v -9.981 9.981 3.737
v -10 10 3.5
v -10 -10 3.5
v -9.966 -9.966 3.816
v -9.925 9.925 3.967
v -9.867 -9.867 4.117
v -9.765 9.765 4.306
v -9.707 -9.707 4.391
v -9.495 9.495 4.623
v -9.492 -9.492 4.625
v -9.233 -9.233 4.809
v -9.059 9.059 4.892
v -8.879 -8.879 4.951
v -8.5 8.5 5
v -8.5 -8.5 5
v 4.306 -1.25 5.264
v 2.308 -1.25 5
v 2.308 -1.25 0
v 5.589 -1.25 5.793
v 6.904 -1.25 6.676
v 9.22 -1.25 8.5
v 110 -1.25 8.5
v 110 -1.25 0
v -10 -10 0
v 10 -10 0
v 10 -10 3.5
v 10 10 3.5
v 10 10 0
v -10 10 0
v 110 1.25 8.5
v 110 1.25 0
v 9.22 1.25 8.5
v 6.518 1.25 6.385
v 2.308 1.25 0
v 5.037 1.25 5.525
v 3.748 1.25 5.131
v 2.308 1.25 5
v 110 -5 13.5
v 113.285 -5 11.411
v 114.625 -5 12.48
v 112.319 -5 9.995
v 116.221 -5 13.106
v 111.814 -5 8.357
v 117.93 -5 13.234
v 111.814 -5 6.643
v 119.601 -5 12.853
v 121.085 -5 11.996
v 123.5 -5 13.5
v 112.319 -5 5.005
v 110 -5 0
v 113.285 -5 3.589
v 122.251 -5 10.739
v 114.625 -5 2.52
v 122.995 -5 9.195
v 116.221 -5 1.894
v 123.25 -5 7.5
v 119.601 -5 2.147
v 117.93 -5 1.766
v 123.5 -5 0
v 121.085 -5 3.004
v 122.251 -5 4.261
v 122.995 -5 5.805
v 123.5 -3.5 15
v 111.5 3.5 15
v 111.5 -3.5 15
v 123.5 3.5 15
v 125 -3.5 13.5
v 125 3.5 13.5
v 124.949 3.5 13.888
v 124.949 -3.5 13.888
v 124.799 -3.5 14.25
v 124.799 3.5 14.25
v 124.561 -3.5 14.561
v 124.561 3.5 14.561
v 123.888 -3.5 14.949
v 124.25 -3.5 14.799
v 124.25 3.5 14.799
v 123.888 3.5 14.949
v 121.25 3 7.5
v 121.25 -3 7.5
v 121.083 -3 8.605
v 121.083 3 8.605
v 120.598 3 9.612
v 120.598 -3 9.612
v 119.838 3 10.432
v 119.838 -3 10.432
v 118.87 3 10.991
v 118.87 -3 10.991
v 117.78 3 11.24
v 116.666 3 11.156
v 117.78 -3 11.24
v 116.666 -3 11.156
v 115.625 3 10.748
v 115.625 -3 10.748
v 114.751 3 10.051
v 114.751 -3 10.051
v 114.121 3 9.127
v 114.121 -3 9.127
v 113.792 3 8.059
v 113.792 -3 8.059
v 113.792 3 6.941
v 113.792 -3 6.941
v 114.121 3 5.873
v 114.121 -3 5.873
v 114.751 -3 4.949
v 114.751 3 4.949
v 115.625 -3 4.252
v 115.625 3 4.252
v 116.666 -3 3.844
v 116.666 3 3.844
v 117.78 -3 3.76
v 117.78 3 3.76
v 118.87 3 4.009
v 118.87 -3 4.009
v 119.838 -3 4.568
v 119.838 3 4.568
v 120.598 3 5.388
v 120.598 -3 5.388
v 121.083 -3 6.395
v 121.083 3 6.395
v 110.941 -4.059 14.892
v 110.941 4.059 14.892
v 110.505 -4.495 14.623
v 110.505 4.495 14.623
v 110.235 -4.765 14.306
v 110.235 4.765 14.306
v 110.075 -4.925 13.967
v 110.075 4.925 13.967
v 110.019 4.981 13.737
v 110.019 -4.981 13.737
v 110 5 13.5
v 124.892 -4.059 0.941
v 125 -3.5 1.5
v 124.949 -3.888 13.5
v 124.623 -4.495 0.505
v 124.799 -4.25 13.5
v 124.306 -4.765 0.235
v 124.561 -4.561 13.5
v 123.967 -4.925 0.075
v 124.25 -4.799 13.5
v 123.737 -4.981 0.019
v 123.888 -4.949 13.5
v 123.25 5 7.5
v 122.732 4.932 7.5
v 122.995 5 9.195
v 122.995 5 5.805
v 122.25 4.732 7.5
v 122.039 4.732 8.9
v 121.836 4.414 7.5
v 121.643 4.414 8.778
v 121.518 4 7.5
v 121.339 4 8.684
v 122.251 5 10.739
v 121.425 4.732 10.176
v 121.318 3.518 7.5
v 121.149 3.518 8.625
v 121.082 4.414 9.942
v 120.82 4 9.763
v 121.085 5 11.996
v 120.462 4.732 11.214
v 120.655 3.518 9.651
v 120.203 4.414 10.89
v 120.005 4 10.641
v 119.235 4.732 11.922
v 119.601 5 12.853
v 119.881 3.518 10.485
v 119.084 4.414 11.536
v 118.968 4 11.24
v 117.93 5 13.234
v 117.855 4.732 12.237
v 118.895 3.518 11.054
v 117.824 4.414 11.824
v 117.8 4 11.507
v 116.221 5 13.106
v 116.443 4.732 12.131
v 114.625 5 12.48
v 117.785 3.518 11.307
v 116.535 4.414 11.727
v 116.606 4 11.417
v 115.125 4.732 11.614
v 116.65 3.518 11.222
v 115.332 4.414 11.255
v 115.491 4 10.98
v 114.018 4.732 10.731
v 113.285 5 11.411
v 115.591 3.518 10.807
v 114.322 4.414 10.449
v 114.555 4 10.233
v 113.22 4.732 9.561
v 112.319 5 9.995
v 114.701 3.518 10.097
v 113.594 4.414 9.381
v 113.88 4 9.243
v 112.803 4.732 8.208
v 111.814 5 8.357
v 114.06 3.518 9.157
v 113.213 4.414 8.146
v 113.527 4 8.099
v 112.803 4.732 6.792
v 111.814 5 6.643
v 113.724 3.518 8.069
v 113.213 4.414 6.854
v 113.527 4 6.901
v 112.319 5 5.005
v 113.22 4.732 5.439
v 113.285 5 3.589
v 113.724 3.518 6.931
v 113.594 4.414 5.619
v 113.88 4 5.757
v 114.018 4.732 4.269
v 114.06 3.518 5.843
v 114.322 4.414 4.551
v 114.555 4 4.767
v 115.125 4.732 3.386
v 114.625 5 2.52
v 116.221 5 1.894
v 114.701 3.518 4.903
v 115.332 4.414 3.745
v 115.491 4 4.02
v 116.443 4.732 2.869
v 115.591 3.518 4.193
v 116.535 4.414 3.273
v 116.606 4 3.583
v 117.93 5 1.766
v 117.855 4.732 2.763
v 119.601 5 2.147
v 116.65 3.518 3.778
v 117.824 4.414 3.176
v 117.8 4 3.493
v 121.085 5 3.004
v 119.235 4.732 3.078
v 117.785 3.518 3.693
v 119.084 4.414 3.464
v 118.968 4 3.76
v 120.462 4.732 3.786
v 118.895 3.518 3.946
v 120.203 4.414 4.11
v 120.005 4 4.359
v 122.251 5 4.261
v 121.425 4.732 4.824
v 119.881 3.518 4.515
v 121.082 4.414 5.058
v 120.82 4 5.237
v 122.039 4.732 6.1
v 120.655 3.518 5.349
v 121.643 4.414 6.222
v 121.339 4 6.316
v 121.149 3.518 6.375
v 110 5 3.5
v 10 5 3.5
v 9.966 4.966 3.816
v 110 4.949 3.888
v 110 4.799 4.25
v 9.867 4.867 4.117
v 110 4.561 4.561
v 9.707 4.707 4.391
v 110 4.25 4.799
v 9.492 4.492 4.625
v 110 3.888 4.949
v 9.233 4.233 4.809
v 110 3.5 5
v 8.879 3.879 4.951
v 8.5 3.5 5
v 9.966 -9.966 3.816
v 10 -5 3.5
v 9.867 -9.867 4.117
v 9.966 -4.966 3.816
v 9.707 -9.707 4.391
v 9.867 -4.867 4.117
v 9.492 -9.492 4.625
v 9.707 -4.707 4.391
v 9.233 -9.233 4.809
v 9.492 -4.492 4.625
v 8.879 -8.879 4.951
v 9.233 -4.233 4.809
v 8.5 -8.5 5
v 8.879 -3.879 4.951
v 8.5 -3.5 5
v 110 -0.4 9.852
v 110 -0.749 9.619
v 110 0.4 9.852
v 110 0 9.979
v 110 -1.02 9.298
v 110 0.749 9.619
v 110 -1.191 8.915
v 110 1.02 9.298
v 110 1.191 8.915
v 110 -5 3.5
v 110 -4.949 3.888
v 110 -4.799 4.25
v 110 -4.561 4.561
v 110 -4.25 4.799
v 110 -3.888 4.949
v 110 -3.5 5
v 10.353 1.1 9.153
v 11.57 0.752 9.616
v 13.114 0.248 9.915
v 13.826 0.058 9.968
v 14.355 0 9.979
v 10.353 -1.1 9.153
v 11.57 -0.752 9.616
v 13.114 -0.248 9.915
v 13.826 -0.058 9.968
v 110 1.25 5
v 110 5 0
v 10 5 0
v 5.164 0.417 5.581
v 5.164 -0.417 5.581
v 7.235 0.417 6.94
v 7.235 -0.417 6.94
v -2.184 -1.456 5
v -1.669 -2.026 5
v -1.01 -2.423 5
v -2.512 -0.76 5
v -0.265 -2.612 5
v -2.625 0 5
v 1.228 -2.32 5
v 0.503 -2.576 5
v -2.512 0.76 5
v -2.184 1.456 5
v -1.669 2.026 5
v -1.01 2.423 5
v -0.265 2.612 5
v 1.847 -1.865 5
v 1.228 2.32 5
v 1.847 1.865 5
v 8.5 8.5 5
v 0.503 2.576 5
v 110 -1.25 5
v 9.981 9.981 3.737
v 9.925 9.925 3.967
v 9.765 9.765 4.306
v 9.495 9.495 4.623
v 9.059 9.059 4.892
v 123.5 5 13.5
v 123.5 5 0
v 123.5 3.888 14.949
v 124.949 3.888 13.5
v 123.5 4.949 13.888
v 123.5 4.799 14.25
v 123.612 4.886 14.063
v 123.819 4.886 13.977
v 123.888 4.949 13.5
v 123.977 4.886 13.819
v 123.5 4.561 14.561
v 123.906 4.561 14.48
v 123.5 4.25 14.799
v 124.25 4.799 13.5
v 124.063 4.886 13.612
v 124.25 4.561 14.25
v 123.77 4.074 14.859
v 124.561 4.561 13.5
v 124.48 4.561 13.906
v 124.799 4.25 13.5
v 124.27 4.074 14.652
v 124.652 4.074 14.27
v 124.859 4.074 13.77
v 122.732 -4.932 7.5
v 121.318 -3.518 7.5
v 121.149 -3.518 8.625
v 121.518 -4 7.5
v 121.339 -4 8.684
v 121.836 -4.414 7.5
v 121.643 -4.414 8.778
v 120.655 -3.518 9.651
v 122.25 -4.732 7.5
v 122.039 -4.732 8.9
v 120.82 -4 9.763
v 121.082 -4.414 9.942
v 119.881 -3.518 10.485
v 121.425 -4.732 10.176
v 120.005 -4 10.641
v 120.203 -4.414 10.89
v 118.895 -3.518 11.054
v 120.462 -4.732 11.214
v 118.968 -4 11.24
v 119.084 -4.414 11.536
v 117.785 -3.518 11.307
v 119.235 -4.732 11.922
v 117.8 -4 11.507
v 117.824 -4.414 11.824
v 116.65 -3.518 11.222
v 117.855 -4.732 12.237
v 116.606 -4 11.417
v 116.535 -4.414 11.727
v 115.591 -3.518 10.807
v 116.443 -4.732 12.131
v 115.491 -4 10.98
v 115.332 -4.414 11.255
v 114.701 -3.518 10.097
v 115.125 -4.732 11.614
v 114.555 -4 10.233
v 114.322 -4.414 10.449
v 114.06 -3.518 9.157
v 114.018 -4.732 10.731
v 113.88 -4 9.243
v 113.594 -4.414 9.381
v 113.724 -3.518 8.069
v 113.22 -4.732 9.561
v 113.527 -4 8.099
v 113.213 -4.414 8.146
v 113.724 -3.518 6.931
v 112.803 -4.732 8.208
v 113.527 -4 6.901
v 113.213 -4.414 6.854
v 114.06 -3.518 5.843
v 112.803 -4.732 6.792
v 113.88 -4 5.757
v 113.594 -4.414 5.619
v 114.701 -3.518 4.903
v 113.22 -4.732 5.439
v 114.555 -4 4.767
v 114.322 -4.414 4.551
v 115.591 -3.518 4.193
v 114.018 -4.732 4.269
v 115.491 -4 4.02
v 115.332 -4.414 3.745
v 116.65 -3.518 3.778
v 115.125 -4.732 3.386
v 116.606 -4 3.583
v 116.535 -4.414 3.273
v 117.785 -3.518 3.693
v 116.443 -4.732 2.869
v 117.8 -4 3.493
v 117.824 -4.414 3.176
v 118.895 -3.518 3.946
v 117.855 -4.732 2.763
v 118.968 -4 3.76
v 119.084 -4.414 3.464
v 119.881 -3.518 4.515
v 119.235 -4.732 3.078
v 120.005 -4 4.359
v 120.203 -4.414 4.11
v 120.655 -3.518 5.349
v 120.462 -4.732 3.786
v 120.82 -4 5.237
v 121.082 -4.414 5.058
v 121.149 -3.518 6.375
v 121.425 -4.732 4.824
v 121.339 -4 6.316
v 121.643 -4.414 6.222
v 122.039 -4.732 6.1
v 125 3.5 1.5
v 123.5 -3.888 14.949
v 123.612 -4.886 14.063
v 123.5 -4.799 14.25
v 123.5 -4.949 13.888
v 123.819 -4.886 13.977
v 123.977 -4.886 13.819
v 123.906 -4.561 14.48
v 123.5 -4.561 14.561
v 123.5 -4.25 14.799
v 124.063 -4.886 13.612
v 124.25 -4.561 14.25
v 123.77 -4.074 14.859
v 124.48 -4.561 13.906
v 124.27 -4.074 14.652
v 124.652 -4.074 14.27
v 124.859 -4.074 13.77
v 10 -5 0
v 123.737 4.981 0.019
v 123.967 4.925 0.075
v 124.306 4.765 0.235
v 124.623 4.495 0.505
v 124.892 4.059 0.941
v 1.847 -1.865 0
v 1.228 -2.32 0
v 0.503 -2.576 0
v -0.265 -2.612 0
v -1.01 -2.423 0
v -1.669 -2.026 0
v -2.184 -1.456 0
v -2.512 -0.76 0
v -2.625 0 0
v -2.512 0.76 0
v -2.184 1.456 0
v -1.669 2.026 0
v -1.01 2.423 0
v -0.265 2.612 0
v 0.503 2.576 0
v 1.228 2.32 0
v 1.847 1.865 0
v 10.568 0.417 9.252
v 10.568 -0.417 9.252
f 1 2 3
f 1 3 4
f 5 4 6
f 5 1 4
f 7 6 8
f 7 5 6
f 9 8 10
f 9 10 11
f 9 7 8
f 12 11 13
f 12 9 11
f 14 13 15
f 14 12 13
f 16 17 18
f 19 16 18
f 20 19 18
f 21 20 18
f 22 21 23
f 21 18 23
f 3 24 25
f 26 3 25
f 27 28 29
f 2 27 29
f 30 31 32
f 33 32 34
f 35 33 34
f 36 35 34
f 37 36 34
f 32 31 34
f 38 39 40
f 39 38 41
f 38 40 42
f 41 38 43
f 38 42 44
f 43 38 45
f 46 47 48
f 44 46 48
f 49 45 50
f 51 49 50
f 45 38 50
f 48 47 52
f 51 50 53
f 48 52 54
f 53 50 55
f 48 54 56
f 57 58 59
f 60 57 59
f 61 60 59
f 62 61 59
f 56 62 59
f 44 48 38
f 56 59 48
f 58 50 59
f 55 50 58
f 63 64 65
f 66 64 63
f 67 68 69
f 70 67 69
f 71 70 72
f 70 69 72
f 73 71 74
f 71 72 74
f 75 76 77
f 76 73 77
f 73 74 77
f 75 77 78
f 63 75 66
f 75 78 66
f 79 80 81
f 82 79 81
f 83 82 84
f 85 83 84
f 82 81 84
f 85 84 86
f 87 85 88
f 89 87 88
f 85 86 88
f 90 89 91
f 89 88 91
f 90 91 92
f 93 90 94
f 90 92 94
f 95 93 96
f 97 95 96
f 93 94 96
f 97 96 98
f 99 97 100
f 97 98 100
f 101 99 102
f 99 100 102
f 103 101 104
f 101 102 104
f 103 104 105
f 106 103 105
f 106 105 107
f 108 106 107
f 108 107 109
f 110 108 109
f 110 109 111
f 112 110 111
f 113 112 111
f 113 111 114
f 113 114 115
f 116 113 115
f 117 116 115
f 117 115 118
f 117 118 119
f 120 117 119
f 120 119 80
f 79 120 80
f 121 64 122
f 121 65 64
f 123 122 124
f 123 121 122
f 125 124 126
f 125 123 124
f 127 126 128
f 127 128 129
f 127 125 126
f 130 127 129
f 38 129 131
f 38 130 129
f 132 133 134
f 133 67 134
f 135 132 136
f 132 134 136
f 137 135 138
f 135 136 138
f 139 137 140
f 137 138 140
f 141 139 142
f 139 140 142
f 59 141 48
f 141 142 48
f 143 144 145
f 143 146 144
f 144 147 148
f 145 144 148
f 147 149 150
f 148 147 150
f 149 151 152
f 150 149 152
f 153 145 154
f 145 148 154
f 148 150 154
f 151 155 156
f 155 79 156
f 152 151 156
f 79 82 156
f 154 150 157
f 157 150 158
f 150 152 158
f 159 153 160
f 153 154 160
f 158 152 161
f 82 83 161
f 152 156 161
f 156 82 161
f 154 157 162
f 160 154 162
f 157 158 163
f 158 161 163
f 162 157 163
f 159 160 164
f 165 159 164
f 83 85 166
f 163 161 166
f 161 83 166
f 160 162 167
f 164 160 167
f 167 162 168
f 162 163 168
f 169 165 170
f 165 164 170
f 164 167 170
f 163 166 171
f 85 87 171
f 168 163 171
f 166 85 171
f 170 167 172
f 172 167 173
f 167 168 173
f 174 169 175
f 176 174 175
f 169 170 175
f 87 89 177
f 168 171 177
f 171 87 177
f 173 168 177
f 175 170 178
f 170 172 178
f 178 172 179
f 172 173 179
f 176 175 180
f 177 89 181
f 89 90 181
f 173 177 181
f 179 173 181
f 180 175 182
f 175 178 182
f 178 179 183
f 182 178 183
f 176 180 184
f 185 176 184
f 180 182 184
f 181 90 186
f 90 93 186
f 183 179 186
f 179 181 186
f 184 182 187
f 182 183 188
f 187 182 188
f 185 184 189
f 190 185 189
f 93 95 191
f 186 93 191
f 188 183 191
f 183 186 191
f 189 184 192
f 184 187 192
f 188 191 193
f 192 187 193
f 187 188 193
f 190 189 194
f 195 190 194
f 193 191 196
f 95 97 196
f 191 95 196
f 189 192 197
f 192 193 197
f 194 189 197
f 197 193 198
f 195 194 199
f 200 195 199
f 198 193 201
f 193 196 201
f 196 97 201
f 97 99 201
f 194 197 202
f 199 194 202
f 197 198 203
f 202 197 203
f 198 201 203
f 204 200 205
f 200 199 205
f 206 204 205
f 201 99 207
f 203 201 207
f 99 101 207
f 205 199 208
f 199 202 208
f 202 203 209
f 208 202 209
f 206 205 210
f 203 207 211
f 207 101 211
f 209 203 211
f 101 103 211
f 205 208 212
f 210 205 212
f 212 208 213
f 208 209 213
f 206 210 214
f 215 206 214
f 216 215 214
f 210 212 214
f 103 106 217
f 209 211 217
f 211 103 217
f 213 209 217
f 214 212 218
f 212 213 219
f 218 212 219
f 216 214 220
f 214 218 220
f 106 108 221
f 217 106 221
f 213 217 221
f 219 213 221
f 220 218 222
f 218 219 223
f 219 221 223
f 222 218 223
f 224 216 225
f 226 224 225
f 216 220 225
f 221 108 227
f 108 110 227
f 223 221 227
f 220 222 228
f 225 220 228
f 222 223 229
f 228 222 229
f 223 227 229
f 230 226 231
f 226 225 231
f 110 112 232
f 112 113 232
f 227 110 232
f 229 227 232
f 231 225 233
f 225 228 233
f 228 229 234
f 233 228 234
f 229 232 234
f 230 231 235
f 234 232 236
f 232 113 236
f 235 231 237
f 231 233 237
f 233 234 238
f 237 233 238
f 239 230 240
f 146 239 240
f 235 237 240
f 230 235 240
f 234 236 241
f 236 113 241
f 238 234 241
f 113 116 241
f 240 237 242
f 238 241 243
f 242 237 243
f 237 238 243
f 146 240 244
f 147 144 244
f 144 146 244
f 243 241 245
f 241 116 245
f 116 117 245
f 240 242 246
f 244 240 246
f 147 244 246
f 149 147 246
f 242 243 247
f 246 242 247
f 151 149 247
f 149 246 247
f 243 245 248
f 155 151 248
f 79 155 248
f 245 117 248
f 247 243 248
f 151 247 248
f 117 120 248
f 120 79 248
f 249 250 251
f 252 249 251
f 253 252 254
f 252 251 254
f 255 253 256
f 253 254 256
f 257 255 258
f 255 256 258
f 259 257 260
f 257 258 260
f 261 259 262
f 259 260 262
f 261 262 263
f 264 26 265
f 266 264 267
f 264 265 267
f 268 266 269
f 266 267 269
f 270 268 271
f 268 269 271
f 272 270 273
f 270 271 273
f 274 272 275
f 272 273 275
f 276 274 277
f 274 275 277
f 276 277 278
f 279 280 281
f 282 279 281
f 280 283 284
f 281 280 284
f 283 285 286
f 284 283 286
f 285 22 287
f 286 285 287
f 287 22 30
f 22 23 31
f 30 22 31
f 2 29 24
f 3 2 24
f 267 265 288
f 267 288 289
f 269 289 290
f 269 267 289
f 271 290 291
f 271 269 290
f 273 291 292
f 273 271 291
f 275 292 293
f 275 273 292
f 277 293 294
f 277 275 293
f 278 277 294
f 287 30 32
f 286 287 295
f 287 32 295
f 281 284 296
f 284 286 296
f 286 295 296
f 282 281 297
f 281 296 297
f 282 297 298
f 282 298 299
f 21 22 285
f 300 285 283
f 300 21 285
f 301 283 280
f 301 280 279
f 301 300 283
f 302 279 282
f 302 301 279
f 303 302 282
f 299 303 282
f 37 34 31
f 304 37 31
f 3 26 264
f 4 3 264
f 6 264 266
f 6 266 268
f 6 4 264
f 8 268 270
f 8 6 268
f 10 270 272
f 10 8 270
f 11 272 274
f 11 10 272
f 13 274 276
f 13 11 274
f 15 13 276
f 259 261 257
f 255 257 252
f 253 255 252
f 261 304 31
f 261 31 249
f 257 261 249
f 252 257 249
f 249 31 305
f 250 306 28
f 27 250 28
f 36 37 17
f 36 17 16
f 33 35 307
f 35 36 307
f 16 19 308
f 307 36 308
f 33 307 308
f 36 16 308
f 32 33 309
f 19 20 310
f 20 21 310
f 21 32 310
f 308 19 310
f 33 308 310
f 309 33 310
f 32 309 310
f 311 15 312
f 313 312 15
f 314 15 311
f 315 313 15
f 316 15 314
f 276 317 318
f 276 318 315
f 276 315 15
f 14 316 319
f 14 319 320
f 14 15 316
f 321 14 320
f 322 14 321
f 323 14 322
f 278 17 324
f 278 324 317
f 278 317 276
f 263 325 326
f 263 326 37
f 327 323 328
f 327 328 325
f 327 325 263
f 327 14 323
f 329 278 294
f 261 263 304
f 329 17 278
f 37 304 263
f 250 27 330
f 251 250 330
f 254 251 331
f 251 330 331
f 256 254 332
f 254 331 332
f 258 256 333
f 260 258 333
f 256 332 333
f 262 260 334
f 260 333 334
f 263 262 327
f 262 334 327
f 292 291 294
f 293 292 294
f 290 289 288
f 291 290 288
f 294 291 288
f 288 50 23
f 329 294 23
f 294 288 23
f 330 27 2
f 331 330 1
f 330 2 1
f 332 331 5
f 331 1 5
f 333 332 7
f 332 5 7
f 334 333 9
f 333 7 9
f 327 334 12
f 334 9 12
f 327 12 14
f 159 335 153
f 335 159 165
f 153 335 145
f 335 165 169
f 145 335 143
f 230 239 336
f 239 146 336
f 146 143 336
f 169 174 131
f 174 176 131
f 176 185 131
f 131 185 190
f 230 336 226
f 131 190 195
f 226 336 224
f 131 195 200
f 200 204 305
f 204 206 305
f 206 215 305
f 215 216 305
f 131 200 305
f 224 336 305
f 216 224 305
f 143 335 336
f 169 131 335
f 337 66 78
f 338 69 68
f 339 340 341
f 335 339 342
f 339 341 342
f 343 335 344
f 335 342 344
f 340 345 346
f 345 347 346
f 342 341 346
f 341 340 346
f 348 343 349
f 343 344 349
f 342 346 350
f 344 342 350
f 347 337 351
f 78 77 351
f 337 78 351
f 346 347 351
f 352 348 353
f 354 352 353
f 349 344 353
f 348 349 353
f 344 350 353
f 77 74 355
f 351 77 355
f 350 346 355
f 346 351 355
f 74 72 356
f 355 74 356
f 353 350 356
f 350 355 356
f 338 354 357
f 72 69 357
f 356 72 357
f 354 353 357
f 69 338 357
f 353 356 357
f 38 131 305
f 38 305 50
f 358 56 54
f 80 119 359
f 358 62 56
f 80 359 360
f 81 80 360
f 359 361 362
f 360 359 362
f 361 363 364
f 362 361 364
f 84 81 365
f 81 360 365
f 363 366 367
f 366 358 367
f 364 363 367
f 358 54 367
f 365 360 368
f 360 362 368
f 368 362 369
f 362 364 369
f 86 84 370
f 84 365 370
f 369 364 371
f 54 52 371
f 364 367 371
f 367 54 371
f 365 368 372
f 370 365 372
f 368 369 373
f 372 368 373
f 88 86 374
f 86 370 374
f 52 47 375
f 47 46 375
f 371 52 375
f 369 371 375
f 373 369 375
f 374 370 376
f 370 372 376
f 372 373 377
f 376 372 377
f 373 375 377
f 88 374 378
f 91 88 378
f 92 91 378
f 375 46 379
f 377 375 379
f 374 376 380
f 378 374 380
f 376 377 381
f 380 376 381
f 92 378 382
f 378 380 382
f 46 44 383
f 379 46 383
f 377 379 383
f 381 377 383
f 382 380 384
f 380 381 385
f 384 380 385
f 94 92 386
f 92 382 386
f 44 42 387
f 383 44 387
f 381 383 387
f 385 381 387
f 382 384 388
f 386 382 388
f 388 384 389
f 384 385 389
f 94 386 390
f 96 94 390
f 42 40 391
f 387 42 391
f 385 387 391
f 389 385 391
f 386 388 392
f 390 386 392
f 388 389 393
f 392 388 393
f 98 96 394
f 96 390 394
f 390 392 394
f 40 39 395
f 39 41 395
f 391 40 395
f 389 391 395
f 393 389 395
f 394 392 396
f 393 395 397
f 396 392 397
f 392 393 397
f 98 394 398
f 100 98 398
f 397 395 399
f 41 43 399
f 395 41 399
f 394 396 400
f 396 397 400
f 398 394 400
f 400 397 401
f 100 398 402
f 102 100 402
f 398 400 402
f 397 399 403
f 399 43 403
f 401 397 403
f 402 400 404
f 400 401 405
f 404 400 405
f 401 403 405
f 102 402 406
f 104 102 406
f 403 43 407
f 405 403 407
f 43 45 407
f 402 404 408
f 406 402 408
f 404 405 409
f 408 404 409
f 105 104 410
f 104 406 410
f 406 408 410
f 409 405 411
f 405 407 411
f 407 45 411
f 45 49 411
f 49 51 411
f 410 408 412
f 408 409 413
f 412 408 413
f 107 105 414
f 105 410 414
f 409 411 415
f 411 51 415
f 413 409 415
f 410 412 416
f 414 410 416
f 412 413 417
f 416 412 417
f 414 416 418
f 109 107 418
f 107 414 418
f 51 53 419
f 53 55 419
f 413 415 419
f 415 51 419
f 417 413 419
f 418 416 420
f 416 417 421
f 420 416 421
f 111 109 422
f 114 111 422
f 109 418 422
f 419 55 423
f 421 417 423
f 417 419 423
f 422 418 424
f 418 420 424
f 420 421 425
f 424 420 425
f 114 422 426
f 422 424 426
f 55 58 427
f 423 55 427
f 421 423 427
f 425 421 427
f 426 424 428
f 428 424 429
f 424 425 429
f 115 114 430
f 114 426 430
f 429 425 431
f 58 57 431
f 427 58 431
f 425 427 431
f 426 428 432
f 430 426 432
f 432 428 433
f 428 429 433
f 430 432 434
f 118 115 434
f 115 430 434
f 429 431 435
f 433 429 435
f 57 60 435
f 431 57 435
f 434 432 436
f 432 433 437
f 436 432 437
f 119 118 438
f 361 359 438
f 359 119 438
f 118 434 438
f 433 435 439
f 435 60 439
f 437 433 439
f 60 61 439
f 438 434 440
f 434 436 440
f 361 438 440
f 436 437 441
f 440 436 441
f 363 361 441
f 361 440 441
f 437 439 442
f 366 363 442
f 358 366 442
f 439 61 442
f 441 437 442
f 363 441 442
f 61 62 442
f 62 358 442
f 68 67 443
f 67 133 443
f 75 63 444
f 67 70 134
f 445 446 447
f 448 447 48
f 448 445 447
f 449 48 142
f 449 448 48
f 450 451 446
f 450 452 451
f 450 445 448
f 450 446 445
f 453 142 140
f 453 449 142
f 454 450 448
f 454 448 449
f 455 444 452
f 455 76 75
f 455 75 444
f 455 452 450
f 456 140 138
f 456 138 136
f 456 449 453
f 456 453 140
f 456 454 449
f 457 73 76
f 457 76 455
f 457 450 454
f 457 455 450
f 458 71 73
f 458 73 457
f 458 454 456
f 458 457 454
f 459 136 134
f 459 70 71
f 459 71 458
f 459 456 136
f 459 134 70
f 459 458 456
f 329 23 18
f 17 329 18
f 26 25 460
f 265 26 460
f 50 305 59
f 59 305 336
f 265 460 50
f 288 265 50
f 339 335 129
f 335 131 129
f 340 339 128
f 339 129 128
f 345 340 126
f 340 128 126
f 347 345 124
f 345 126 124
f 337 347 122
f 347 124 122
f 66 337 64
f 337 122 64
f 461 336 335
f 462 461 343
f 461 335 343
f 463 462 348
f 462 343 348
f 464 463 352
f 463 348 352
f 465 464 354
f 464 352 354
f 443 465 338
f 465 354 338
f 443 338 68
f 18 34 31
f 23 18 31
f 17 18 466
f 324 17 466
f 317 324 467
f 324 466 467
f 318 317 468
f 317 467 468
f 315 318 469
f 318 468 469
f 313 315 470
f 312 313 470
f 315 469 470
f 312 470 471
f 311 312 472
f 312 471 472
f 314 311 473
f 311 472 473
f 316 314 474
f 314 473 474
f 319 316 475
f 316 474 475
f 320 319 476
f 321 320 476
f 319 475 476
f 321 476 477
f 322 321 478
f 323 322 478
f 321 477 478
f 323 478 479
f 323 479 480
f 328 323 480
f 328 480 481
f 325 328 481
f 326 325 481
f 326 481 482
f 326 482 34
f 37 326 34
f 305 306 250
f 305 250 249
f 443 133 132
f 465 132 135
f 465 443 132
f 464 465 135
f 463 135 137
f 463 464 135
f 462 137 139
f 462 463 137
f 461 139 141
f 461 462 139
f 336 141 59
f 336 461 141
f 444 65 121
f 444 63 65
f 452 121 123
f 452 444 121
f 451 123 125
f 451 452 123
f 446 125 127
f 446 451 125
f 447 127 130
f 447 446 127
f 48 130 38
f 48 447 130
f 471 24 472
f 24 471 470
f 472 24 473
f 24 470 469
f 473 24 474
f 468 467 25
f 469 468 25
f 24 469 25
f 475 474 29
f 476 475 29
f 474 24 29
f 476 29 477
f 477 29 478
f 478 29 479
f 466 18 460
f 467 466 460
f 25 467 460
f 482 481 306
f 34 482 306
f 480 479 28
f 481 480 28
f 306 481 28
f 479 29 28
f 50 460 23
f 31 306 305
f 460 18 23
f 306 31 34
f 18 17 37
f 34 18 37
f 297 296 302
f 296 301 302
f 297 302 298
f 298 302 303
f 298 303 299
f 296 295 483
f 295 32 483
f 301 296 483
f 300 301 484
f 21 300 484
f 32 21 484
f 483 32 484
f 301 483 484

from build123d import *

# Parameters (mm, degrees)
F0_W          = 100
F0_H          = 3.75
F1_DEPTH      = 5
F0_H_2        = 2.5
F2_DEPTH      = 10
F3_DEPTH      = 15
F4_R          = 3.75
F5_DEPTH      = 30.025
F6_R          = 1.5
F7_T1_DEPTH   = 103.75
F7_T3_DEPTH   = 27.5
F7_T5_DEPTH   = 8.75
F7_T7_DEPTH   = 8.75
F7_T9_DEPTH   = 27.5
F7_T15_DEPTH  = 12.5
F7_T19_DEPTH  = 107.5
F7_T26_DEPTH  = 107.5
F7_T30_DEPTH  = 12.5
F7_2_T1_DEPTH = 117.5
F9_DEPTH      = 25
F9_FACE_W     = 2.3082731641
F9_FACE_H     = 2.5
F10_DEPTH     = 25
F11_R         = 2


# Not quite as in the source:
# - a fillet or chamfer that OpenCascade refuses, or shapes differently, is made with other operations: its cross-section is extruded or revolved along the edge and cut away or added
# - a feature names something its author has since deleted; it is built from what else it names


with BuildPart() as f1:
    # F0 (on Top) → F1 (new body)
    with BuildSketch(Plane.XY):
        with BuildLine():
            Line((10, 10), (-10, 10))
            Line((-10, 10), (-10, -10))
            Line((-10, -10), (10, -10))
            Line((10, -10), (10, -5))
            Line((10, -5), (10, -1.25))
            Line((10, -1.25), (2.3082731641, -1.25))
            ThreePointArc((2.3082731641, -1.25), (-2.625, 0), (2.3082731641, 1.25))
            Line((2.3082731641, 1.25), (10, 1.25))
            Line((10, 1.25), (10, 5))
            Line((10, 5), (10, 10))
        make_face()
        with Locations((60, 3.125)):
            Rectangle(F0_W, F0_H)
        with Locations((60, -3.125)):
            Rectangle(F0_W, F0_H)
    extrude(amount=F1_DEPTH)

    # F7: fillet of radius 1.5 on 7 edges, made by hand

    # F7_s2 → F7_t1 (cut)
    with BuildSketch(Plane.YZ.offset(10)):
        with BuildLine():
            ThreePointArc((-5, 3.5), (-4.5606601718, 4.5606601718), (-3.5, 5))
            Line((-3.5, 5), (-5, 5))
            Line((-5, 5), (-5, 3.5))
        make_face()
        with BuildLine():
            ThreePointArc((5, 3.5), (4.5606601718, 4.5606601718), (3.5, 5))
            Line((3.5, 5), (5, 5))
            Line((5, 5), (5, 3.5))
        make_face()
    extrude(amount=F7_T1_DEPTH, mode=Mode.SUBTRACT)

    # F7_s4 → F7_t3 (cut)
    with BuildSketch(Plane.YZ.offset(-13.75)):
        with BuildLine():
            ThreePointArc((10, 3.5), (9.5606601718, 4.5606601718), (8.5, 5))
            Line((8.5, 5), (10, 5))
            Line((10, 5), (10, 3.5))
        make_face()
        with BuildLine():
            ThreePointArc((-10, 3.5), (-9.5606601718, 4.5606601718), (-8.5, 5))
            Line((-8.5, 5), (-10, 5))
            Line((-10, 5), (-10, 3.5))
        make_face()
    extrude(amount=F7_T3_DEPTH, mode=Mode.SUBTRACT)

    # F7_s6 → F7_t5 (cut)
    with BuildSketch(Plane.XZ.offset(-13.75)):
        with BuildLine():
            ThreePointArc((10, 3.5), (9.5606601718, 4.5606601718), (8.5, 5))
            Line((8.5, 5), (10, 5))
            Line((10, 5), (10, 3.5))
        make_face()
    extrude(amount=F7_T5_DEPTH, mode=Mode.SUBTRACT)

    # F7_s8 → F7_t7 (cut)
    with BuildSketch(Plane.XZ.offset(5)):
        with BuildLine():
            ThreePointArc((10, 3.5), (9.5606601718, 4.5606601718), (8.5, 5))
            Line((8.5, 5), (10, 5))
            Line((10, 5), (10, 3.5))
        make_face()
    extrude(amount=F7_T7_DEPTH, mode=Mode.SUBTRACT)

    # F7_s10 → F7_t9 (cut)
    with BuildSketch(Plane.XZ.offset(-13.75)):
        with BuildLine():
            ThreePointArc((-10, 3.5), (-9.5606601718, 4.5606601718), (-8.5, 5))
            Line((-8.5, 5), (-10, 5))
            Line((-10, 5), (-10, 3.5))
        make_face()
    extrude(amount=F7_T9_DEPTH, mode=Mode.SUBTRACT)


with BuildPart() as f2:
    # F0 (on Top) → F2 (new body)
    with BuildSketch(Plane.XY):
        with BuildLine():
            ThreePointArc((2.625, 0), (2.5445866124, 0.6447510932), (2.3082731641, 1.25))
            Line((2.3082731641, 1.25), (0, 1.25))
            Line((0, 1.25), (0, -1.25))
            Line((0, -1.25), (2.3082731641, -1.25))
            ThreePointArc((2.3082731641, -1.25), (2.5445866124, -0.6447510932), (2.625, 0))
        make_face()
        with BuildLine():
            Line((10, -1.25), (10, 1.25))
            Line((10, 1.25), (2.3082731641, 1.25))
            ThreePointArc((2.3082731641, 1.25), (2.5445866124, 0.6447510932), (2.625, 0))
            ThreePointArc((2.625, 0), (2.5445866124, -0.6447510932), (2.3082731641, -1.25))
            Line((2.3082731641, -1.25), (10, -1.25))
        make_face()
        with Locations((60, 0)):
            Rectangle(F0_W, F0_H_2)
    extrude(amount=F2_DEPTH)

    # F7#2: fillet of radius 1.5 on 2 edges, made by hand

    # F7_2_s2 → F7_2_t1 (cut)
    with BuildSketch(Plane.YZ.offset(-3.75)):
        with BuildLine():
            ThreePointArc((-1.25, 8.5), (-0.8106601718, 9.5606601718), (0.25, 10))
            Line((0.25, 10), (-1.25, 10))
            Line((-1.25, 10), (-1.25, 8.5))
        make_face()
        with BuildLine():
            ThreePointArc((1.25, 8.5), (0.8106601718, 9.5606601718), (-0.25, 10))
            Line((-0.25, 10), (1.25, 10))
            Line((1.25, 10), (1.25, 8.5))
        make_face()
    extrude(amount=F7_2_T1_DEPTH, mode=Mode.SUBTRACT)

    # F8 (on face) → F9 (cut)
    with BuildSketch(Plane.XZ.offset(1.25)):
        with BuildLine():
            Line((0, 5), (2.3082731641, 5))
            add(Edge.make_bspline(
                [(2.3082731641, 5), (5.7885707555, 5), (7.0454086994, 7.0322147924), (9.2201348345, 8.5)],
                knots=[0, 0, 0, 0, 8.3278889996, 8.3278889996, 8.3278889996, 8.3278889996], degree=3))
            Line((9.2201348345, 8.5), (0, 8.5))
            Line((0, 8.5), (0, 5))
        make_face()
        with BuildLine():
            Line((0, 8.5), (9.2201348345, 8.5))
            add(Edge.make_bspline(
                [(9.2201348345, 8.5), (10.4494255604, 9.3296836618), (11.9720012822, 9.9790199458), (14.3552316788, 9.9790199458)],
                knots=[8.3278889996, 8.3278889996, 8.3278889996, 8.3278889996, 13.0353308004, 13.0353308004, 13.0353308004, 13.0353308004], degree=3))
            Line((14.3552316788, 9.9790199458), (0, 9.9790199458))
            Line((0, 9.9790199458), (0, 8.5))
        make_face()
    extrude(amount=-F9_DEPTH, mode=Mode.SUBTRACT)

    # F0 (on Top) + F9_face (on face) → F10 (cut)
    with BuildSketch(Plane.XY):
        with BuildLine():
            Line((0, 1.25), (2.3082731641, 1.25))
            ThreePointArc((2.3082731641, 1.25), (-2.625, 0), (2.3082731641, -1.25))
            Line((2.3082731641, -1.25), (0, -1.25))
            Line((0, -1.25), (0, 1.25))
        make_face()
    with BuildSketch(Plane(origin=(1.154136582, 0, 5), x_dir=(1, 0, 0), z_dir=(0, 0, 1))):
        Rectangle(F9_FACE_W, F9_FACE_H)
    extrude(amount=-F10_DEPTH, mode=Mode.SUBTRACT)


with BuildPart() as f3:
    # F0 (on Top) → F3 (new body)
    with BuildSketch(Plane.XY):
        Polygon((125, 5), (110, 5), (110, 1.25), (110, -1.25), (110, -5), (125, -5), align=None)
    extrude(amount=F3_DEPTH)

    # F4 (on face) → F5 (cut)
    with BuildSketch(Plane.XZ.offset(5)):
        with Locations((117.5, 7.5)):
            Circle(F4_R)
    extrude(amount=-F5_DEPTH, mode=Mode.SUBTRACT)

    # F6
    f6_edges = [f3.edges().sort_by_distance(p)[0] for p in [
        (110, 0, 15),
        (125, 0, 15),
        (125, 0, 0),
        (117.5, -5, 15),
        (125, -5, 7.5),
        (117.5, 5, 15),
        (125, 5, 7.5),
    ]]
    fillet(f6_edges, radius=F6_R)

    # F11
    f11_edges = [f3.edges().sort_by_distance(p)[0] for p in [
        (113.75, -5, 7.5),
        (113.75, 5, 7.5),
    ]]
    fillet(f11_edges, radius=F11_R)


with BuildPart() as f7_tool13:
    # F7_s14 → F7_t15 (new body)
    with BuildSketch(Plane.XZ.offset(13.75)):
        with BuildLine():
            ThreePointArc((10, 3.5), (9.5606601718, 4.5606601718), (8.5, 5))
            Line((8.5, 5), (10, 5))
            Line((10, 5), (10, 3.5))
        make_face()
    extrude(amount=-F7_T15_DEPTH)

    split(bisect_by=Plane.XZ.offset(5), keep=Keep.BOTTOM)


with BuildPart() as f7_tool17:
    # F7_s18 → F7_t19 (new body)
    with BuildSketch(Plane.YZ.offset(6.25)):
        with BuildLine():
            ThreePointArc((-5, 3.5), (-4.5606601718, 4.5606601718), (-3.5, 5))
            Line((-3.5, 5), (-5, 5))
            Line((-5, 5), (-5, 3.5))
        make_face()
    extrude(amount=F7_T19_DEPTH)

    split(bisect_by=Plane.YZ.offset(10), keep=Keep.BOTTOM)


with BuildPart() as f7_tool13_1:
    add(f7_tool13.part)

    # F7_t21: intersect F7_tool17
    add(f7_tool17.part, mode=Mode.INTERSECT)


with BuildPart() as f1_1:
    add(f1.part)

    # F7_t11: cut F7_tool13
    add(f7_tool13_1.part, mode=Mode.SUBTRACT)


with BuildPart() as f7_tool24:
    # F7_s25 → F7_t26 (new body)
    with BuildSketch(Plane.YZ.offset(113.75)):
        with BuildLine():
            ThreePointArc((5, 3.5), (4.5606601718, 4.5606601718), (3.5, 5))
            Line((3.5, 5), (5, 5))
            Line((5, 5), (5, 3.5))
        make_face()
    extrude(amount=-F7_T26_DEPTH)

    split(bisect_by=Plane.YZ.offset(10), keep=Keep.BOTTOM)


with BuildPart() as f7_tool28:
    # F7_s29 → F7_t30 (new body)
    with BuildSketch(Plane.XZ.offset(-1.25)):
        with BuildLine():
            ThreePointArc((10, 3.5), (9.5606601718, 4.5606601718), (8.5, 5))
            Line((8.5, 5), (10, 5))
            Line((10, 5), (10, 3.5))
        make_face()
    extrude(amount=-F7_T30_DEPTH)

    split(bisect_by=Plane.XZ.offset(-5), keep=Keep.TOP)


with BuildPart() as f7_tool24_1:
    add(f7_tool24.part)

    # F7_t32: intersect F7_tool28
    add(f7_tool28.part, mode=Mode.INTERSECT)


with BuildPart() as f1_2:
    add(f1_1.part)

    # F7_t22: cut F7_tool24
    add(f7_tool24_1.part, mode=Mode.SUBTRACT)


solid = Compound([f2.part, f3.part, f1_2.part])
